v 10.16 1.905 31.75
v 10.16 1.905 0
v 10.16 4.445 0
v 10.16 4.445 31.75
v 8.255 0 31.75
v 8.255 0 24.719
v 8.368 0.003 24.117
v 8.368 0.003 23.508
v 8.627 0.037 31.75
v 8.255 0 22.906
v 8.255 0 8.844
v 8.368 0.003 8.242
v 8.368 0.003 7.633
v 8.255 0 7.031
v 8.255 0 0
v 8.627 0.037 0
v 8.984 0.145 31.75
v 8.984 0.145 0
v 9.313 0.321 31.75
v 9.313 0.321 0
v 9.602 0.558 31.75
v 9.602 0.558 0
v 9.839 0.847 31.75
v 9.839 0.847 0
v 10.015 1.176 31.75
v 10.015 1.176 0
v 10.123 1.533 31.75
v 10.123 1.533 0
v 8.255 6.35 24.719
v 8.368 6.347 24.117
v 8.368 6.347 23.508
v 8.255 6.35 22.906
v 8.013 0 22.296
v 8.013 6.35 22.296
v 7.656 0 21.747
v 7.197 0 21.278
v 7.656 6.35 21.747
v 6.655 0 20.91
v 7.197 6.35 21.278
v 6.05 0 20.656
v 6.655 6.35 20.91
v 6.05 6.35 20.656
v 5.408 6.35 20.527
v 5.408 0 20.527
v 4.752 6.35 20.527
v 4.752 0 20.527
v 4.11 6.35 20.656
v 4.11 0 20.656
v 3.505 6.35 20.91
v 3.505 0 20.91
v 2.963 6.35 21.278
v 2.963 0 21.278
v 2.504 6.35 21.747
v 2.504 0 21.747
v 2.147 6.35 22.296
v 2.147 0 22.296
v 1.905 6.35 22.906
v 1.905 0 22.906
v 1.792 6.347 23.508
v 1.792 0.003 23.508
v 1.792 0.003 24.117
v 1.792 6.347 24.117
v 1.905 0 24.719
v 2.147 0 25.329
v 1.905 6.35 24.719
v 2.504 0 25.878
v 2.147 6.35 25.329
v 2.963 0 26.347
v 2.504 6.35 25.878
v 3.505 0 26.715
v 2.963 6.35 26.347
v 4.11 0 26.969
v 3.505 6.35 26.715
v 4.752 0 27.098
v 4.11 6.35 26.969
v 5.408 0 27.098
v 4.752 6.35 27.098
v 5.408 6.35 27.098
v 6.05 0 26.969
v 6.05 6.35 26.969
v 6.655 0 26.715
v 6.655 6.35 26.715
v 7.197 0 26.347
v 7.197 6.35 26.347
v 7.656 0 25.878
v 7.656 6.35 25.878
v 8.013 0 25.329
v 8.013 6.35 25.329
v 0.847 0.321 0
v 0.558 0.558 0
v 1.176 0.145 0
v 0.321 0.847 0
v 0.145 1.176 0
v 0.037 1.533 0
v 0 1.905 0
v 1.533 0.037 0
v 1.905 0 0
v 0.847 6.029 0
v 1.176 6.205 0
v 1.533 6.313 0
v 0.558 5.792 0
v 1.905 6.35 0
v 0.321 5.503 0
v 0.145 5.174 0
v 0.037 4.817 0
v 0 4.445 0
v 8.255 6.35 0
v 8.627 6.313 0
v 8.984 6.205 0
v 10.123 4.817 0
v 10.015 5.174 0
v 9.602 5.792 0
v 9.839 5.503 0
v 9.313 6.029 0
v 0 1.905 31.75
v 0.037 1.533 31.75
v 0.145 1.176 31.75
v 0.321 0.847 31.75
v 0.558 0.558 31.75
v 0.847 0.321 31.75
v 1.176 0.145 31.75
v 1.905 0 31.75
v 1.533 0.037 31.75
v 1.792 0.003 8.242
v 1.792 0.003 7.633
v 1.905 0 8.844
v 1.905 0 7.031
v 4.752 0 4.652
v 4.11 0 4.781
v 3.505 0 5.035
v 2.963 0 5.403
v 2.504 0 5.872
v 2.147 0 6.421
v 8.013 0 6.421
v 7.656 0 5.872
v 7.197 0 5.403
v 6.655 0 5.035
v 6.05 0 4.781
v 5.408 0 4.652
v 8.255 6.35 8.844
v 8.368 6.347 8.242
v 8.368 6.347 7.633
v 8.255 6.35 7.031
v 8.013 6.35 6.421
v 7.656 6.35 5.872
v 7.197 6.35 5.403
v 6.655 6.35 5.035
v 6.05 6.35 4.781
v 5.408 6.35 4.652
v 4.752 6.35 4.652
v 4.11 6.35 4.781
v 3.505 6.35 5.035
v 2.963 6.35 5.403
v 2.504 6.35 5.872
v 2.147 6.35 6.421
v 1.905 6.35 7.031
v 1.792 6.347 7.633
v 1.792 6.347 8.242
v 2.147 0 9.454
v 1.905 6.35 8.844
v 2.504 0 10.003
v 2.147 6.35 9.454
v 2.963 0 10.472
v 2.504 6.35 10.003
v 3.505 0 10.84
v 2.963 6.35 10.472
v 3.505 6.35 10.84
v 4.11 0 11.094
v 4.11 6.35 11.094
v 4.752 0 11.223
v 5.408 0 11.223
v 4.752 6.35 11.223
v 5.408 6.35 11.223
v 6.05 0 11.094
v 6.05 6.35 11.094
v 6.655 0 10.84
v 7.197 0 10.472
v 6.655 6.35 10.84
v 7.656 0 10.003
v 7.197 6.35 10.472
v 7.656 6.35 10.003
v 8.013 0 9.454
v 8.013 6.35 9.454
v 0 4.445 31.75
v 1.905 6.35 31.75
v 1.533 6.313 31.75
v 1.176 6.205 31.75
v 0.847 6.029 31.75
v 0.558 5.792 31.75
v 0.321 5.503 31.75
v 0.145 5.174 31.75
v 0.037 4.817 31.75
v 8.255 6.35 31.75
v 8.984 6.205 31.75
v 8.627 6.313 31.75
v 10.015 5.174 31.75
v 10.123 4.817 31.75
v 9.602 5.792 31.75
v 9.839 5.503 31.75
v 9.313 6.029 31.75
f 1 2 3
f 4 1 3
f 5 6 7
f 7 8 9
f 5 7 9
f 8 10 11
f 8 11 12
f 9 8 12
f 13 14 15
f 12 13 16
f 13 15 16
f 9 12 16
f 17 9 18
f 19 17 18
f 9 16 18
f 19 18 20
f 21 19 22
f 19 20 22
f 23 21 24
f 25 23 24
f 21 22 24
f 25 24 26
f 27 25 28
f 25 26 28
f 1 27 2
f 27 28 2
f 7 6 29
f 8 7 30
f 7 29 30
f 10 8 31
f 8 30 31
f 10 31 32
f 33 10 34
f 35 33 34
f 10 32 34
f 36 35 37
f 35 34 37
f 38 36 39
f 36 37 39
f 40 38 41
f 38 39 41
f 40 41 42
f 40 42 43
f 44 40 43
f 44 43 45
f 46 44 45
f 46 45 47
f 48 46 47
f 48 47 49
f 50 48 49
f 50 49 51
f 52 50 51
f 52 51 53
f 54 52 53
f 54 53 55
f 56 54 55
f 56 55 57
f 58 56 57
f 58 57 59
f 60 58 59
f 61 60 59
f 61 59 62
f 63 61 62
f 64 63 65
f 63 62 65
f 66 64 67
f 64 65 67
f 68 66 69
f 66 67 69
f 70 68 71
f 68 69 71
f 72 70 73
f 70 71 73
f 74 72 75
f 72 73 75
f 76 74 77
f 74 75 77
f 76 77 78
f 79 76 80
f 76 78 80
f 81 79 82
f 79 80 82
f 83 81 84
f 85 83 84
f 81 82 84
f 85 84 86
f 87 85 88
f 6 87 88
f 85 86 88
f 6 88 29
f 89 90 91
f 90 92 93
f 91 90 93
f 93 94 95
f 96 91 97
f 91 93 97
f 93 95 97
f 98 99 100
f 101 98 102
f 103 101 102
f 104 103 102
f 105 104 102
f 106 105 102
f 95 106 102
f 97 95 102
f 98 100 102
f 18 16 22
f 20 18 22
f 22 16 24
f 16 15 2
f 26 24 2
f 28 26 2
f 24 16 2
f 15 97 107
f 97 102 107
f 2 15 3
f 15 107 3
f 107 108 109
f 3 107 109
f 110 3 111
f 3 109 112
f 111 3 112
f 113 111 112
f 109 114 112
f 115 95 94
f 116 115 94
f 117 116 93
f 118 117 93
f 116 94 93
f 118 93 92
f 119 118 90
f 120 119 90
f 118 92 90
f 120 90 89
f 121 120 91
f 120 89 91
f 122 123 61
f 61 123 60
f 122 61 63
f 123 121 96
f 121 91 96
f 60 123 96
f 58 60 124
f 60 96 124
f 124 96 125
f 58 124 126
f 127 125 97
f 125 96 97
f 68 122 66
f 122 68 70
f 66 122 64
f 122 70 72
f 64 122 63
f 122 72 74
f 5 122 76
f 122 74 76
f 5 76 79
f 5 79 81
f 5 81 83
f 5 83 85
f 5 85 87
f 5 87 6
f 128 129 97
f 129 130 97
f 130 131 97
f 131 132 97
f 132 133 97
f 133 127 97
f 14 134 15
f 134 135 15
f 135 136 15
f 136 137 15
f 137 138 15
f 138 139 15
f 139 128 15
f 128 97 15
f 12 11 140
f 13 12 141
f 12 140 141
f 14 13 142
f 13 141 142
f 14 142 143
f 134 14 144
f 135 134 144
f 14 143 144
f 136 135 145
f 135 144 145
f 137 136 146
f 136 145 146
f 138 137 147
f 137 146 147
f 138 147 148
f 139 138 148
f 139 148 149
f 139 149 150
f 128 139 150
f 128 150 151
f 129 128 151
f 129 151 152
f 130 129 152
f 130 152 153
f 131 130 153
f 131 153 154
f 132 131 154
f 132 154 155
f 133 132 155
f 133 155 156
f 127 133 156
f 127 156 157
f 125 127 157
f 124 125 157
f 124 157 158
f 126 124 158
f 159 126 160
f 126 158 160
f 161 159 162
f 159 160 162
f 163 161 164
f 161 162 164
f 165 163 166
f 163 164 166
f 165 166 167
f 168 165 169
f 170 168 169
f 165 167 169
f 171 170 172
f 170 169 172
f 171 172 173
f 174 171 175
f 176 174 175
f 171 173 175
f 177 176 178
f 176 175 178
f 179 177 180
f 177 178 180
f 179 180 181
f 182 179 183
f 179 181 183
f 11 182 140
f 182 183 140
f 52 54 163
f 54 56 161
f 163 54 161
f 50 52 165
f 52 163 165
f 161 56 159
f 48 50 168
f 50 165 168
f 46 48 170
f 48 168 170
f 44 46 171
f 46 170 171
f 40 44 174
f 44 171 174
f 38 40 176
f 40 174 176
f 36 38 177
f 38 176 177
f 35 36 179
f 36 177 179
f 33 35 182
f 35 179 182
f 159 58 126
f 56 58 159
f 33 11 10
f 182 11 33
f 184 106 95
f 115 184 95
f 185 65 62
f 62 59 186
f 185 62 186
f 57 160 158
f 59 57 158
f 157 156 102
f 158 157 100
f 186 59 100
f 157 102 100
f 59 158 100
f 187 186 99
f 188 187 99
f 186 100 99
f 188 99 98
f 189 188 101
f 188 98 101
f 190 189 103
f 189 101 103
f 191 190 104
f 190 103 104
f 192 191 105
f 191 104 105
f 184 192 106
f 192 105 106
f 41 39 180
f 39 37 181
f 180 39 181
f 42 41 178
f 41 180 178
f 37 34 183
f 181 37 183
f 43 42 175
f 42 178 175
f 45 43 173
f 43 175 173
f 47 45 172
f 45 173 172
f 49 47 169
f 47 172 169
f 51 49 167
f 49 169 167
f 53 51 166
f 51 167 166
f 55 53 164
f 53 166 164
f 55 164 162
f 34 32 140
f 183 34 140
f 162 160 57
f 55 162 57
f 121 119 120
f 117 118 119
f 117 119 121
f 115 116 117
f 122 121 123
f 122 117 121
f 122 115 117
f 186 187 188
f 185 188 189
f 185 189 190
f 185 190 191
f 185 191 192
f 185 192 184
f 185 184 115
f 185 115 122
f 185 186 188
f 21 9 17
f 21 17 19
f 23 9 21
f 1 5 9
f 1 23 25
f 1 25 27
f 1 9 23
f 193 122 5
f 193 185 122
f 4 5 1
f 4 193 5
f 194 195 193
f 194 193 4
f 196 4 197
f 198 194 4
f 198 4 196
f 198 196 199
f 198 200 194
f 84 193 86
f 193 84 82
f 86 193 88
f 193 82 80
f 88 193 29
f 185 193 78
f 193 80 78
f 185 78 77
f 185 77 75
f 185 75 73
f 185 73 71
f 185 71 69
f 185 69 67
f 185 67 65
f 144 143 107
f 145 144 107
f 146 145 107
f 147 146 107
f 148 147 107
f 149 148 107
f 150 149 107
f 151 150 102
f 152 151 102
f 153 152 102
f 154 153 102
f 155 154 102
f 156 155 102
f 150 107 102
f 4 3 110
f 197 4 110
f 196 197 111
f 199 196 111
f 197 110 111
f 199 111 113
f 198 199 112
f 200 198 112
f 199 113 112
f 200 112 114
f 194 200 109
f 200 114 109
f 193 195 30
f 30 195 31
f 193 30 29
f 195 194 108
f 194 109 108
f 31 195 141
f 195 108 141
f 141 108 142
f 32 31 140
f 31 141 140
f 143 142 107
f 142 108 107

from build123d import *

# Parameters (mm, degrees)
BOSS_EXTRUDE1_DEPTH = 31.75
SKETCH2_R           = 3.302
CUT_EXTRUDE1_DEPTH  = 31.75


with BuildPart() as part:
    # Sketch1 → Boss-Extrude1 (new body)
    with BuildSketch(Plane.XY):
        with BuildLine():
            Line((1.905, 0), (8.255, 0))
            ThreePointArc((8.255, 0), (9.602038418, 0.557961582), (10.16, 1.905))
            Line((10.16, 1.905), (10.16, 4.445))
            ThreePointArc((10.16, 4.445), (9.602038418, 5.792038418), (8.255, 6.35))
            Line((8.255, 6.35), (1.905, 6.35))
            ThreePointArc((1.905, 6.35), (0.557961582, 5.792038418), (0, 4.445))
            Line((0, 4.445), (0, 1.905))
            ThreePointArc((0, 1.905), (0.557961582, 0.557961582), (1.905, 0))
        make_face()
    extrude(amount=BOSS_EXTRUDE1_DEPTH)

    # Sketch2 → Cut-Extrude1 (cut)
    with BuildSketch(Plane(origin=(0, 6.35, 0), x_dir=(1, 0, 0), z_dir=(0, 1, 0))):
        with Locations((5.08, -7.9375)):
            Circle(SKETCH2_R)
        with Locations((5.08, -23.8125)):
            Circle(SKETCH2_R)
    extrude(amount=-CUT_EXTRUDE1_DEPTH, mode=Mode.SUBTRACT)


solid = part.part
